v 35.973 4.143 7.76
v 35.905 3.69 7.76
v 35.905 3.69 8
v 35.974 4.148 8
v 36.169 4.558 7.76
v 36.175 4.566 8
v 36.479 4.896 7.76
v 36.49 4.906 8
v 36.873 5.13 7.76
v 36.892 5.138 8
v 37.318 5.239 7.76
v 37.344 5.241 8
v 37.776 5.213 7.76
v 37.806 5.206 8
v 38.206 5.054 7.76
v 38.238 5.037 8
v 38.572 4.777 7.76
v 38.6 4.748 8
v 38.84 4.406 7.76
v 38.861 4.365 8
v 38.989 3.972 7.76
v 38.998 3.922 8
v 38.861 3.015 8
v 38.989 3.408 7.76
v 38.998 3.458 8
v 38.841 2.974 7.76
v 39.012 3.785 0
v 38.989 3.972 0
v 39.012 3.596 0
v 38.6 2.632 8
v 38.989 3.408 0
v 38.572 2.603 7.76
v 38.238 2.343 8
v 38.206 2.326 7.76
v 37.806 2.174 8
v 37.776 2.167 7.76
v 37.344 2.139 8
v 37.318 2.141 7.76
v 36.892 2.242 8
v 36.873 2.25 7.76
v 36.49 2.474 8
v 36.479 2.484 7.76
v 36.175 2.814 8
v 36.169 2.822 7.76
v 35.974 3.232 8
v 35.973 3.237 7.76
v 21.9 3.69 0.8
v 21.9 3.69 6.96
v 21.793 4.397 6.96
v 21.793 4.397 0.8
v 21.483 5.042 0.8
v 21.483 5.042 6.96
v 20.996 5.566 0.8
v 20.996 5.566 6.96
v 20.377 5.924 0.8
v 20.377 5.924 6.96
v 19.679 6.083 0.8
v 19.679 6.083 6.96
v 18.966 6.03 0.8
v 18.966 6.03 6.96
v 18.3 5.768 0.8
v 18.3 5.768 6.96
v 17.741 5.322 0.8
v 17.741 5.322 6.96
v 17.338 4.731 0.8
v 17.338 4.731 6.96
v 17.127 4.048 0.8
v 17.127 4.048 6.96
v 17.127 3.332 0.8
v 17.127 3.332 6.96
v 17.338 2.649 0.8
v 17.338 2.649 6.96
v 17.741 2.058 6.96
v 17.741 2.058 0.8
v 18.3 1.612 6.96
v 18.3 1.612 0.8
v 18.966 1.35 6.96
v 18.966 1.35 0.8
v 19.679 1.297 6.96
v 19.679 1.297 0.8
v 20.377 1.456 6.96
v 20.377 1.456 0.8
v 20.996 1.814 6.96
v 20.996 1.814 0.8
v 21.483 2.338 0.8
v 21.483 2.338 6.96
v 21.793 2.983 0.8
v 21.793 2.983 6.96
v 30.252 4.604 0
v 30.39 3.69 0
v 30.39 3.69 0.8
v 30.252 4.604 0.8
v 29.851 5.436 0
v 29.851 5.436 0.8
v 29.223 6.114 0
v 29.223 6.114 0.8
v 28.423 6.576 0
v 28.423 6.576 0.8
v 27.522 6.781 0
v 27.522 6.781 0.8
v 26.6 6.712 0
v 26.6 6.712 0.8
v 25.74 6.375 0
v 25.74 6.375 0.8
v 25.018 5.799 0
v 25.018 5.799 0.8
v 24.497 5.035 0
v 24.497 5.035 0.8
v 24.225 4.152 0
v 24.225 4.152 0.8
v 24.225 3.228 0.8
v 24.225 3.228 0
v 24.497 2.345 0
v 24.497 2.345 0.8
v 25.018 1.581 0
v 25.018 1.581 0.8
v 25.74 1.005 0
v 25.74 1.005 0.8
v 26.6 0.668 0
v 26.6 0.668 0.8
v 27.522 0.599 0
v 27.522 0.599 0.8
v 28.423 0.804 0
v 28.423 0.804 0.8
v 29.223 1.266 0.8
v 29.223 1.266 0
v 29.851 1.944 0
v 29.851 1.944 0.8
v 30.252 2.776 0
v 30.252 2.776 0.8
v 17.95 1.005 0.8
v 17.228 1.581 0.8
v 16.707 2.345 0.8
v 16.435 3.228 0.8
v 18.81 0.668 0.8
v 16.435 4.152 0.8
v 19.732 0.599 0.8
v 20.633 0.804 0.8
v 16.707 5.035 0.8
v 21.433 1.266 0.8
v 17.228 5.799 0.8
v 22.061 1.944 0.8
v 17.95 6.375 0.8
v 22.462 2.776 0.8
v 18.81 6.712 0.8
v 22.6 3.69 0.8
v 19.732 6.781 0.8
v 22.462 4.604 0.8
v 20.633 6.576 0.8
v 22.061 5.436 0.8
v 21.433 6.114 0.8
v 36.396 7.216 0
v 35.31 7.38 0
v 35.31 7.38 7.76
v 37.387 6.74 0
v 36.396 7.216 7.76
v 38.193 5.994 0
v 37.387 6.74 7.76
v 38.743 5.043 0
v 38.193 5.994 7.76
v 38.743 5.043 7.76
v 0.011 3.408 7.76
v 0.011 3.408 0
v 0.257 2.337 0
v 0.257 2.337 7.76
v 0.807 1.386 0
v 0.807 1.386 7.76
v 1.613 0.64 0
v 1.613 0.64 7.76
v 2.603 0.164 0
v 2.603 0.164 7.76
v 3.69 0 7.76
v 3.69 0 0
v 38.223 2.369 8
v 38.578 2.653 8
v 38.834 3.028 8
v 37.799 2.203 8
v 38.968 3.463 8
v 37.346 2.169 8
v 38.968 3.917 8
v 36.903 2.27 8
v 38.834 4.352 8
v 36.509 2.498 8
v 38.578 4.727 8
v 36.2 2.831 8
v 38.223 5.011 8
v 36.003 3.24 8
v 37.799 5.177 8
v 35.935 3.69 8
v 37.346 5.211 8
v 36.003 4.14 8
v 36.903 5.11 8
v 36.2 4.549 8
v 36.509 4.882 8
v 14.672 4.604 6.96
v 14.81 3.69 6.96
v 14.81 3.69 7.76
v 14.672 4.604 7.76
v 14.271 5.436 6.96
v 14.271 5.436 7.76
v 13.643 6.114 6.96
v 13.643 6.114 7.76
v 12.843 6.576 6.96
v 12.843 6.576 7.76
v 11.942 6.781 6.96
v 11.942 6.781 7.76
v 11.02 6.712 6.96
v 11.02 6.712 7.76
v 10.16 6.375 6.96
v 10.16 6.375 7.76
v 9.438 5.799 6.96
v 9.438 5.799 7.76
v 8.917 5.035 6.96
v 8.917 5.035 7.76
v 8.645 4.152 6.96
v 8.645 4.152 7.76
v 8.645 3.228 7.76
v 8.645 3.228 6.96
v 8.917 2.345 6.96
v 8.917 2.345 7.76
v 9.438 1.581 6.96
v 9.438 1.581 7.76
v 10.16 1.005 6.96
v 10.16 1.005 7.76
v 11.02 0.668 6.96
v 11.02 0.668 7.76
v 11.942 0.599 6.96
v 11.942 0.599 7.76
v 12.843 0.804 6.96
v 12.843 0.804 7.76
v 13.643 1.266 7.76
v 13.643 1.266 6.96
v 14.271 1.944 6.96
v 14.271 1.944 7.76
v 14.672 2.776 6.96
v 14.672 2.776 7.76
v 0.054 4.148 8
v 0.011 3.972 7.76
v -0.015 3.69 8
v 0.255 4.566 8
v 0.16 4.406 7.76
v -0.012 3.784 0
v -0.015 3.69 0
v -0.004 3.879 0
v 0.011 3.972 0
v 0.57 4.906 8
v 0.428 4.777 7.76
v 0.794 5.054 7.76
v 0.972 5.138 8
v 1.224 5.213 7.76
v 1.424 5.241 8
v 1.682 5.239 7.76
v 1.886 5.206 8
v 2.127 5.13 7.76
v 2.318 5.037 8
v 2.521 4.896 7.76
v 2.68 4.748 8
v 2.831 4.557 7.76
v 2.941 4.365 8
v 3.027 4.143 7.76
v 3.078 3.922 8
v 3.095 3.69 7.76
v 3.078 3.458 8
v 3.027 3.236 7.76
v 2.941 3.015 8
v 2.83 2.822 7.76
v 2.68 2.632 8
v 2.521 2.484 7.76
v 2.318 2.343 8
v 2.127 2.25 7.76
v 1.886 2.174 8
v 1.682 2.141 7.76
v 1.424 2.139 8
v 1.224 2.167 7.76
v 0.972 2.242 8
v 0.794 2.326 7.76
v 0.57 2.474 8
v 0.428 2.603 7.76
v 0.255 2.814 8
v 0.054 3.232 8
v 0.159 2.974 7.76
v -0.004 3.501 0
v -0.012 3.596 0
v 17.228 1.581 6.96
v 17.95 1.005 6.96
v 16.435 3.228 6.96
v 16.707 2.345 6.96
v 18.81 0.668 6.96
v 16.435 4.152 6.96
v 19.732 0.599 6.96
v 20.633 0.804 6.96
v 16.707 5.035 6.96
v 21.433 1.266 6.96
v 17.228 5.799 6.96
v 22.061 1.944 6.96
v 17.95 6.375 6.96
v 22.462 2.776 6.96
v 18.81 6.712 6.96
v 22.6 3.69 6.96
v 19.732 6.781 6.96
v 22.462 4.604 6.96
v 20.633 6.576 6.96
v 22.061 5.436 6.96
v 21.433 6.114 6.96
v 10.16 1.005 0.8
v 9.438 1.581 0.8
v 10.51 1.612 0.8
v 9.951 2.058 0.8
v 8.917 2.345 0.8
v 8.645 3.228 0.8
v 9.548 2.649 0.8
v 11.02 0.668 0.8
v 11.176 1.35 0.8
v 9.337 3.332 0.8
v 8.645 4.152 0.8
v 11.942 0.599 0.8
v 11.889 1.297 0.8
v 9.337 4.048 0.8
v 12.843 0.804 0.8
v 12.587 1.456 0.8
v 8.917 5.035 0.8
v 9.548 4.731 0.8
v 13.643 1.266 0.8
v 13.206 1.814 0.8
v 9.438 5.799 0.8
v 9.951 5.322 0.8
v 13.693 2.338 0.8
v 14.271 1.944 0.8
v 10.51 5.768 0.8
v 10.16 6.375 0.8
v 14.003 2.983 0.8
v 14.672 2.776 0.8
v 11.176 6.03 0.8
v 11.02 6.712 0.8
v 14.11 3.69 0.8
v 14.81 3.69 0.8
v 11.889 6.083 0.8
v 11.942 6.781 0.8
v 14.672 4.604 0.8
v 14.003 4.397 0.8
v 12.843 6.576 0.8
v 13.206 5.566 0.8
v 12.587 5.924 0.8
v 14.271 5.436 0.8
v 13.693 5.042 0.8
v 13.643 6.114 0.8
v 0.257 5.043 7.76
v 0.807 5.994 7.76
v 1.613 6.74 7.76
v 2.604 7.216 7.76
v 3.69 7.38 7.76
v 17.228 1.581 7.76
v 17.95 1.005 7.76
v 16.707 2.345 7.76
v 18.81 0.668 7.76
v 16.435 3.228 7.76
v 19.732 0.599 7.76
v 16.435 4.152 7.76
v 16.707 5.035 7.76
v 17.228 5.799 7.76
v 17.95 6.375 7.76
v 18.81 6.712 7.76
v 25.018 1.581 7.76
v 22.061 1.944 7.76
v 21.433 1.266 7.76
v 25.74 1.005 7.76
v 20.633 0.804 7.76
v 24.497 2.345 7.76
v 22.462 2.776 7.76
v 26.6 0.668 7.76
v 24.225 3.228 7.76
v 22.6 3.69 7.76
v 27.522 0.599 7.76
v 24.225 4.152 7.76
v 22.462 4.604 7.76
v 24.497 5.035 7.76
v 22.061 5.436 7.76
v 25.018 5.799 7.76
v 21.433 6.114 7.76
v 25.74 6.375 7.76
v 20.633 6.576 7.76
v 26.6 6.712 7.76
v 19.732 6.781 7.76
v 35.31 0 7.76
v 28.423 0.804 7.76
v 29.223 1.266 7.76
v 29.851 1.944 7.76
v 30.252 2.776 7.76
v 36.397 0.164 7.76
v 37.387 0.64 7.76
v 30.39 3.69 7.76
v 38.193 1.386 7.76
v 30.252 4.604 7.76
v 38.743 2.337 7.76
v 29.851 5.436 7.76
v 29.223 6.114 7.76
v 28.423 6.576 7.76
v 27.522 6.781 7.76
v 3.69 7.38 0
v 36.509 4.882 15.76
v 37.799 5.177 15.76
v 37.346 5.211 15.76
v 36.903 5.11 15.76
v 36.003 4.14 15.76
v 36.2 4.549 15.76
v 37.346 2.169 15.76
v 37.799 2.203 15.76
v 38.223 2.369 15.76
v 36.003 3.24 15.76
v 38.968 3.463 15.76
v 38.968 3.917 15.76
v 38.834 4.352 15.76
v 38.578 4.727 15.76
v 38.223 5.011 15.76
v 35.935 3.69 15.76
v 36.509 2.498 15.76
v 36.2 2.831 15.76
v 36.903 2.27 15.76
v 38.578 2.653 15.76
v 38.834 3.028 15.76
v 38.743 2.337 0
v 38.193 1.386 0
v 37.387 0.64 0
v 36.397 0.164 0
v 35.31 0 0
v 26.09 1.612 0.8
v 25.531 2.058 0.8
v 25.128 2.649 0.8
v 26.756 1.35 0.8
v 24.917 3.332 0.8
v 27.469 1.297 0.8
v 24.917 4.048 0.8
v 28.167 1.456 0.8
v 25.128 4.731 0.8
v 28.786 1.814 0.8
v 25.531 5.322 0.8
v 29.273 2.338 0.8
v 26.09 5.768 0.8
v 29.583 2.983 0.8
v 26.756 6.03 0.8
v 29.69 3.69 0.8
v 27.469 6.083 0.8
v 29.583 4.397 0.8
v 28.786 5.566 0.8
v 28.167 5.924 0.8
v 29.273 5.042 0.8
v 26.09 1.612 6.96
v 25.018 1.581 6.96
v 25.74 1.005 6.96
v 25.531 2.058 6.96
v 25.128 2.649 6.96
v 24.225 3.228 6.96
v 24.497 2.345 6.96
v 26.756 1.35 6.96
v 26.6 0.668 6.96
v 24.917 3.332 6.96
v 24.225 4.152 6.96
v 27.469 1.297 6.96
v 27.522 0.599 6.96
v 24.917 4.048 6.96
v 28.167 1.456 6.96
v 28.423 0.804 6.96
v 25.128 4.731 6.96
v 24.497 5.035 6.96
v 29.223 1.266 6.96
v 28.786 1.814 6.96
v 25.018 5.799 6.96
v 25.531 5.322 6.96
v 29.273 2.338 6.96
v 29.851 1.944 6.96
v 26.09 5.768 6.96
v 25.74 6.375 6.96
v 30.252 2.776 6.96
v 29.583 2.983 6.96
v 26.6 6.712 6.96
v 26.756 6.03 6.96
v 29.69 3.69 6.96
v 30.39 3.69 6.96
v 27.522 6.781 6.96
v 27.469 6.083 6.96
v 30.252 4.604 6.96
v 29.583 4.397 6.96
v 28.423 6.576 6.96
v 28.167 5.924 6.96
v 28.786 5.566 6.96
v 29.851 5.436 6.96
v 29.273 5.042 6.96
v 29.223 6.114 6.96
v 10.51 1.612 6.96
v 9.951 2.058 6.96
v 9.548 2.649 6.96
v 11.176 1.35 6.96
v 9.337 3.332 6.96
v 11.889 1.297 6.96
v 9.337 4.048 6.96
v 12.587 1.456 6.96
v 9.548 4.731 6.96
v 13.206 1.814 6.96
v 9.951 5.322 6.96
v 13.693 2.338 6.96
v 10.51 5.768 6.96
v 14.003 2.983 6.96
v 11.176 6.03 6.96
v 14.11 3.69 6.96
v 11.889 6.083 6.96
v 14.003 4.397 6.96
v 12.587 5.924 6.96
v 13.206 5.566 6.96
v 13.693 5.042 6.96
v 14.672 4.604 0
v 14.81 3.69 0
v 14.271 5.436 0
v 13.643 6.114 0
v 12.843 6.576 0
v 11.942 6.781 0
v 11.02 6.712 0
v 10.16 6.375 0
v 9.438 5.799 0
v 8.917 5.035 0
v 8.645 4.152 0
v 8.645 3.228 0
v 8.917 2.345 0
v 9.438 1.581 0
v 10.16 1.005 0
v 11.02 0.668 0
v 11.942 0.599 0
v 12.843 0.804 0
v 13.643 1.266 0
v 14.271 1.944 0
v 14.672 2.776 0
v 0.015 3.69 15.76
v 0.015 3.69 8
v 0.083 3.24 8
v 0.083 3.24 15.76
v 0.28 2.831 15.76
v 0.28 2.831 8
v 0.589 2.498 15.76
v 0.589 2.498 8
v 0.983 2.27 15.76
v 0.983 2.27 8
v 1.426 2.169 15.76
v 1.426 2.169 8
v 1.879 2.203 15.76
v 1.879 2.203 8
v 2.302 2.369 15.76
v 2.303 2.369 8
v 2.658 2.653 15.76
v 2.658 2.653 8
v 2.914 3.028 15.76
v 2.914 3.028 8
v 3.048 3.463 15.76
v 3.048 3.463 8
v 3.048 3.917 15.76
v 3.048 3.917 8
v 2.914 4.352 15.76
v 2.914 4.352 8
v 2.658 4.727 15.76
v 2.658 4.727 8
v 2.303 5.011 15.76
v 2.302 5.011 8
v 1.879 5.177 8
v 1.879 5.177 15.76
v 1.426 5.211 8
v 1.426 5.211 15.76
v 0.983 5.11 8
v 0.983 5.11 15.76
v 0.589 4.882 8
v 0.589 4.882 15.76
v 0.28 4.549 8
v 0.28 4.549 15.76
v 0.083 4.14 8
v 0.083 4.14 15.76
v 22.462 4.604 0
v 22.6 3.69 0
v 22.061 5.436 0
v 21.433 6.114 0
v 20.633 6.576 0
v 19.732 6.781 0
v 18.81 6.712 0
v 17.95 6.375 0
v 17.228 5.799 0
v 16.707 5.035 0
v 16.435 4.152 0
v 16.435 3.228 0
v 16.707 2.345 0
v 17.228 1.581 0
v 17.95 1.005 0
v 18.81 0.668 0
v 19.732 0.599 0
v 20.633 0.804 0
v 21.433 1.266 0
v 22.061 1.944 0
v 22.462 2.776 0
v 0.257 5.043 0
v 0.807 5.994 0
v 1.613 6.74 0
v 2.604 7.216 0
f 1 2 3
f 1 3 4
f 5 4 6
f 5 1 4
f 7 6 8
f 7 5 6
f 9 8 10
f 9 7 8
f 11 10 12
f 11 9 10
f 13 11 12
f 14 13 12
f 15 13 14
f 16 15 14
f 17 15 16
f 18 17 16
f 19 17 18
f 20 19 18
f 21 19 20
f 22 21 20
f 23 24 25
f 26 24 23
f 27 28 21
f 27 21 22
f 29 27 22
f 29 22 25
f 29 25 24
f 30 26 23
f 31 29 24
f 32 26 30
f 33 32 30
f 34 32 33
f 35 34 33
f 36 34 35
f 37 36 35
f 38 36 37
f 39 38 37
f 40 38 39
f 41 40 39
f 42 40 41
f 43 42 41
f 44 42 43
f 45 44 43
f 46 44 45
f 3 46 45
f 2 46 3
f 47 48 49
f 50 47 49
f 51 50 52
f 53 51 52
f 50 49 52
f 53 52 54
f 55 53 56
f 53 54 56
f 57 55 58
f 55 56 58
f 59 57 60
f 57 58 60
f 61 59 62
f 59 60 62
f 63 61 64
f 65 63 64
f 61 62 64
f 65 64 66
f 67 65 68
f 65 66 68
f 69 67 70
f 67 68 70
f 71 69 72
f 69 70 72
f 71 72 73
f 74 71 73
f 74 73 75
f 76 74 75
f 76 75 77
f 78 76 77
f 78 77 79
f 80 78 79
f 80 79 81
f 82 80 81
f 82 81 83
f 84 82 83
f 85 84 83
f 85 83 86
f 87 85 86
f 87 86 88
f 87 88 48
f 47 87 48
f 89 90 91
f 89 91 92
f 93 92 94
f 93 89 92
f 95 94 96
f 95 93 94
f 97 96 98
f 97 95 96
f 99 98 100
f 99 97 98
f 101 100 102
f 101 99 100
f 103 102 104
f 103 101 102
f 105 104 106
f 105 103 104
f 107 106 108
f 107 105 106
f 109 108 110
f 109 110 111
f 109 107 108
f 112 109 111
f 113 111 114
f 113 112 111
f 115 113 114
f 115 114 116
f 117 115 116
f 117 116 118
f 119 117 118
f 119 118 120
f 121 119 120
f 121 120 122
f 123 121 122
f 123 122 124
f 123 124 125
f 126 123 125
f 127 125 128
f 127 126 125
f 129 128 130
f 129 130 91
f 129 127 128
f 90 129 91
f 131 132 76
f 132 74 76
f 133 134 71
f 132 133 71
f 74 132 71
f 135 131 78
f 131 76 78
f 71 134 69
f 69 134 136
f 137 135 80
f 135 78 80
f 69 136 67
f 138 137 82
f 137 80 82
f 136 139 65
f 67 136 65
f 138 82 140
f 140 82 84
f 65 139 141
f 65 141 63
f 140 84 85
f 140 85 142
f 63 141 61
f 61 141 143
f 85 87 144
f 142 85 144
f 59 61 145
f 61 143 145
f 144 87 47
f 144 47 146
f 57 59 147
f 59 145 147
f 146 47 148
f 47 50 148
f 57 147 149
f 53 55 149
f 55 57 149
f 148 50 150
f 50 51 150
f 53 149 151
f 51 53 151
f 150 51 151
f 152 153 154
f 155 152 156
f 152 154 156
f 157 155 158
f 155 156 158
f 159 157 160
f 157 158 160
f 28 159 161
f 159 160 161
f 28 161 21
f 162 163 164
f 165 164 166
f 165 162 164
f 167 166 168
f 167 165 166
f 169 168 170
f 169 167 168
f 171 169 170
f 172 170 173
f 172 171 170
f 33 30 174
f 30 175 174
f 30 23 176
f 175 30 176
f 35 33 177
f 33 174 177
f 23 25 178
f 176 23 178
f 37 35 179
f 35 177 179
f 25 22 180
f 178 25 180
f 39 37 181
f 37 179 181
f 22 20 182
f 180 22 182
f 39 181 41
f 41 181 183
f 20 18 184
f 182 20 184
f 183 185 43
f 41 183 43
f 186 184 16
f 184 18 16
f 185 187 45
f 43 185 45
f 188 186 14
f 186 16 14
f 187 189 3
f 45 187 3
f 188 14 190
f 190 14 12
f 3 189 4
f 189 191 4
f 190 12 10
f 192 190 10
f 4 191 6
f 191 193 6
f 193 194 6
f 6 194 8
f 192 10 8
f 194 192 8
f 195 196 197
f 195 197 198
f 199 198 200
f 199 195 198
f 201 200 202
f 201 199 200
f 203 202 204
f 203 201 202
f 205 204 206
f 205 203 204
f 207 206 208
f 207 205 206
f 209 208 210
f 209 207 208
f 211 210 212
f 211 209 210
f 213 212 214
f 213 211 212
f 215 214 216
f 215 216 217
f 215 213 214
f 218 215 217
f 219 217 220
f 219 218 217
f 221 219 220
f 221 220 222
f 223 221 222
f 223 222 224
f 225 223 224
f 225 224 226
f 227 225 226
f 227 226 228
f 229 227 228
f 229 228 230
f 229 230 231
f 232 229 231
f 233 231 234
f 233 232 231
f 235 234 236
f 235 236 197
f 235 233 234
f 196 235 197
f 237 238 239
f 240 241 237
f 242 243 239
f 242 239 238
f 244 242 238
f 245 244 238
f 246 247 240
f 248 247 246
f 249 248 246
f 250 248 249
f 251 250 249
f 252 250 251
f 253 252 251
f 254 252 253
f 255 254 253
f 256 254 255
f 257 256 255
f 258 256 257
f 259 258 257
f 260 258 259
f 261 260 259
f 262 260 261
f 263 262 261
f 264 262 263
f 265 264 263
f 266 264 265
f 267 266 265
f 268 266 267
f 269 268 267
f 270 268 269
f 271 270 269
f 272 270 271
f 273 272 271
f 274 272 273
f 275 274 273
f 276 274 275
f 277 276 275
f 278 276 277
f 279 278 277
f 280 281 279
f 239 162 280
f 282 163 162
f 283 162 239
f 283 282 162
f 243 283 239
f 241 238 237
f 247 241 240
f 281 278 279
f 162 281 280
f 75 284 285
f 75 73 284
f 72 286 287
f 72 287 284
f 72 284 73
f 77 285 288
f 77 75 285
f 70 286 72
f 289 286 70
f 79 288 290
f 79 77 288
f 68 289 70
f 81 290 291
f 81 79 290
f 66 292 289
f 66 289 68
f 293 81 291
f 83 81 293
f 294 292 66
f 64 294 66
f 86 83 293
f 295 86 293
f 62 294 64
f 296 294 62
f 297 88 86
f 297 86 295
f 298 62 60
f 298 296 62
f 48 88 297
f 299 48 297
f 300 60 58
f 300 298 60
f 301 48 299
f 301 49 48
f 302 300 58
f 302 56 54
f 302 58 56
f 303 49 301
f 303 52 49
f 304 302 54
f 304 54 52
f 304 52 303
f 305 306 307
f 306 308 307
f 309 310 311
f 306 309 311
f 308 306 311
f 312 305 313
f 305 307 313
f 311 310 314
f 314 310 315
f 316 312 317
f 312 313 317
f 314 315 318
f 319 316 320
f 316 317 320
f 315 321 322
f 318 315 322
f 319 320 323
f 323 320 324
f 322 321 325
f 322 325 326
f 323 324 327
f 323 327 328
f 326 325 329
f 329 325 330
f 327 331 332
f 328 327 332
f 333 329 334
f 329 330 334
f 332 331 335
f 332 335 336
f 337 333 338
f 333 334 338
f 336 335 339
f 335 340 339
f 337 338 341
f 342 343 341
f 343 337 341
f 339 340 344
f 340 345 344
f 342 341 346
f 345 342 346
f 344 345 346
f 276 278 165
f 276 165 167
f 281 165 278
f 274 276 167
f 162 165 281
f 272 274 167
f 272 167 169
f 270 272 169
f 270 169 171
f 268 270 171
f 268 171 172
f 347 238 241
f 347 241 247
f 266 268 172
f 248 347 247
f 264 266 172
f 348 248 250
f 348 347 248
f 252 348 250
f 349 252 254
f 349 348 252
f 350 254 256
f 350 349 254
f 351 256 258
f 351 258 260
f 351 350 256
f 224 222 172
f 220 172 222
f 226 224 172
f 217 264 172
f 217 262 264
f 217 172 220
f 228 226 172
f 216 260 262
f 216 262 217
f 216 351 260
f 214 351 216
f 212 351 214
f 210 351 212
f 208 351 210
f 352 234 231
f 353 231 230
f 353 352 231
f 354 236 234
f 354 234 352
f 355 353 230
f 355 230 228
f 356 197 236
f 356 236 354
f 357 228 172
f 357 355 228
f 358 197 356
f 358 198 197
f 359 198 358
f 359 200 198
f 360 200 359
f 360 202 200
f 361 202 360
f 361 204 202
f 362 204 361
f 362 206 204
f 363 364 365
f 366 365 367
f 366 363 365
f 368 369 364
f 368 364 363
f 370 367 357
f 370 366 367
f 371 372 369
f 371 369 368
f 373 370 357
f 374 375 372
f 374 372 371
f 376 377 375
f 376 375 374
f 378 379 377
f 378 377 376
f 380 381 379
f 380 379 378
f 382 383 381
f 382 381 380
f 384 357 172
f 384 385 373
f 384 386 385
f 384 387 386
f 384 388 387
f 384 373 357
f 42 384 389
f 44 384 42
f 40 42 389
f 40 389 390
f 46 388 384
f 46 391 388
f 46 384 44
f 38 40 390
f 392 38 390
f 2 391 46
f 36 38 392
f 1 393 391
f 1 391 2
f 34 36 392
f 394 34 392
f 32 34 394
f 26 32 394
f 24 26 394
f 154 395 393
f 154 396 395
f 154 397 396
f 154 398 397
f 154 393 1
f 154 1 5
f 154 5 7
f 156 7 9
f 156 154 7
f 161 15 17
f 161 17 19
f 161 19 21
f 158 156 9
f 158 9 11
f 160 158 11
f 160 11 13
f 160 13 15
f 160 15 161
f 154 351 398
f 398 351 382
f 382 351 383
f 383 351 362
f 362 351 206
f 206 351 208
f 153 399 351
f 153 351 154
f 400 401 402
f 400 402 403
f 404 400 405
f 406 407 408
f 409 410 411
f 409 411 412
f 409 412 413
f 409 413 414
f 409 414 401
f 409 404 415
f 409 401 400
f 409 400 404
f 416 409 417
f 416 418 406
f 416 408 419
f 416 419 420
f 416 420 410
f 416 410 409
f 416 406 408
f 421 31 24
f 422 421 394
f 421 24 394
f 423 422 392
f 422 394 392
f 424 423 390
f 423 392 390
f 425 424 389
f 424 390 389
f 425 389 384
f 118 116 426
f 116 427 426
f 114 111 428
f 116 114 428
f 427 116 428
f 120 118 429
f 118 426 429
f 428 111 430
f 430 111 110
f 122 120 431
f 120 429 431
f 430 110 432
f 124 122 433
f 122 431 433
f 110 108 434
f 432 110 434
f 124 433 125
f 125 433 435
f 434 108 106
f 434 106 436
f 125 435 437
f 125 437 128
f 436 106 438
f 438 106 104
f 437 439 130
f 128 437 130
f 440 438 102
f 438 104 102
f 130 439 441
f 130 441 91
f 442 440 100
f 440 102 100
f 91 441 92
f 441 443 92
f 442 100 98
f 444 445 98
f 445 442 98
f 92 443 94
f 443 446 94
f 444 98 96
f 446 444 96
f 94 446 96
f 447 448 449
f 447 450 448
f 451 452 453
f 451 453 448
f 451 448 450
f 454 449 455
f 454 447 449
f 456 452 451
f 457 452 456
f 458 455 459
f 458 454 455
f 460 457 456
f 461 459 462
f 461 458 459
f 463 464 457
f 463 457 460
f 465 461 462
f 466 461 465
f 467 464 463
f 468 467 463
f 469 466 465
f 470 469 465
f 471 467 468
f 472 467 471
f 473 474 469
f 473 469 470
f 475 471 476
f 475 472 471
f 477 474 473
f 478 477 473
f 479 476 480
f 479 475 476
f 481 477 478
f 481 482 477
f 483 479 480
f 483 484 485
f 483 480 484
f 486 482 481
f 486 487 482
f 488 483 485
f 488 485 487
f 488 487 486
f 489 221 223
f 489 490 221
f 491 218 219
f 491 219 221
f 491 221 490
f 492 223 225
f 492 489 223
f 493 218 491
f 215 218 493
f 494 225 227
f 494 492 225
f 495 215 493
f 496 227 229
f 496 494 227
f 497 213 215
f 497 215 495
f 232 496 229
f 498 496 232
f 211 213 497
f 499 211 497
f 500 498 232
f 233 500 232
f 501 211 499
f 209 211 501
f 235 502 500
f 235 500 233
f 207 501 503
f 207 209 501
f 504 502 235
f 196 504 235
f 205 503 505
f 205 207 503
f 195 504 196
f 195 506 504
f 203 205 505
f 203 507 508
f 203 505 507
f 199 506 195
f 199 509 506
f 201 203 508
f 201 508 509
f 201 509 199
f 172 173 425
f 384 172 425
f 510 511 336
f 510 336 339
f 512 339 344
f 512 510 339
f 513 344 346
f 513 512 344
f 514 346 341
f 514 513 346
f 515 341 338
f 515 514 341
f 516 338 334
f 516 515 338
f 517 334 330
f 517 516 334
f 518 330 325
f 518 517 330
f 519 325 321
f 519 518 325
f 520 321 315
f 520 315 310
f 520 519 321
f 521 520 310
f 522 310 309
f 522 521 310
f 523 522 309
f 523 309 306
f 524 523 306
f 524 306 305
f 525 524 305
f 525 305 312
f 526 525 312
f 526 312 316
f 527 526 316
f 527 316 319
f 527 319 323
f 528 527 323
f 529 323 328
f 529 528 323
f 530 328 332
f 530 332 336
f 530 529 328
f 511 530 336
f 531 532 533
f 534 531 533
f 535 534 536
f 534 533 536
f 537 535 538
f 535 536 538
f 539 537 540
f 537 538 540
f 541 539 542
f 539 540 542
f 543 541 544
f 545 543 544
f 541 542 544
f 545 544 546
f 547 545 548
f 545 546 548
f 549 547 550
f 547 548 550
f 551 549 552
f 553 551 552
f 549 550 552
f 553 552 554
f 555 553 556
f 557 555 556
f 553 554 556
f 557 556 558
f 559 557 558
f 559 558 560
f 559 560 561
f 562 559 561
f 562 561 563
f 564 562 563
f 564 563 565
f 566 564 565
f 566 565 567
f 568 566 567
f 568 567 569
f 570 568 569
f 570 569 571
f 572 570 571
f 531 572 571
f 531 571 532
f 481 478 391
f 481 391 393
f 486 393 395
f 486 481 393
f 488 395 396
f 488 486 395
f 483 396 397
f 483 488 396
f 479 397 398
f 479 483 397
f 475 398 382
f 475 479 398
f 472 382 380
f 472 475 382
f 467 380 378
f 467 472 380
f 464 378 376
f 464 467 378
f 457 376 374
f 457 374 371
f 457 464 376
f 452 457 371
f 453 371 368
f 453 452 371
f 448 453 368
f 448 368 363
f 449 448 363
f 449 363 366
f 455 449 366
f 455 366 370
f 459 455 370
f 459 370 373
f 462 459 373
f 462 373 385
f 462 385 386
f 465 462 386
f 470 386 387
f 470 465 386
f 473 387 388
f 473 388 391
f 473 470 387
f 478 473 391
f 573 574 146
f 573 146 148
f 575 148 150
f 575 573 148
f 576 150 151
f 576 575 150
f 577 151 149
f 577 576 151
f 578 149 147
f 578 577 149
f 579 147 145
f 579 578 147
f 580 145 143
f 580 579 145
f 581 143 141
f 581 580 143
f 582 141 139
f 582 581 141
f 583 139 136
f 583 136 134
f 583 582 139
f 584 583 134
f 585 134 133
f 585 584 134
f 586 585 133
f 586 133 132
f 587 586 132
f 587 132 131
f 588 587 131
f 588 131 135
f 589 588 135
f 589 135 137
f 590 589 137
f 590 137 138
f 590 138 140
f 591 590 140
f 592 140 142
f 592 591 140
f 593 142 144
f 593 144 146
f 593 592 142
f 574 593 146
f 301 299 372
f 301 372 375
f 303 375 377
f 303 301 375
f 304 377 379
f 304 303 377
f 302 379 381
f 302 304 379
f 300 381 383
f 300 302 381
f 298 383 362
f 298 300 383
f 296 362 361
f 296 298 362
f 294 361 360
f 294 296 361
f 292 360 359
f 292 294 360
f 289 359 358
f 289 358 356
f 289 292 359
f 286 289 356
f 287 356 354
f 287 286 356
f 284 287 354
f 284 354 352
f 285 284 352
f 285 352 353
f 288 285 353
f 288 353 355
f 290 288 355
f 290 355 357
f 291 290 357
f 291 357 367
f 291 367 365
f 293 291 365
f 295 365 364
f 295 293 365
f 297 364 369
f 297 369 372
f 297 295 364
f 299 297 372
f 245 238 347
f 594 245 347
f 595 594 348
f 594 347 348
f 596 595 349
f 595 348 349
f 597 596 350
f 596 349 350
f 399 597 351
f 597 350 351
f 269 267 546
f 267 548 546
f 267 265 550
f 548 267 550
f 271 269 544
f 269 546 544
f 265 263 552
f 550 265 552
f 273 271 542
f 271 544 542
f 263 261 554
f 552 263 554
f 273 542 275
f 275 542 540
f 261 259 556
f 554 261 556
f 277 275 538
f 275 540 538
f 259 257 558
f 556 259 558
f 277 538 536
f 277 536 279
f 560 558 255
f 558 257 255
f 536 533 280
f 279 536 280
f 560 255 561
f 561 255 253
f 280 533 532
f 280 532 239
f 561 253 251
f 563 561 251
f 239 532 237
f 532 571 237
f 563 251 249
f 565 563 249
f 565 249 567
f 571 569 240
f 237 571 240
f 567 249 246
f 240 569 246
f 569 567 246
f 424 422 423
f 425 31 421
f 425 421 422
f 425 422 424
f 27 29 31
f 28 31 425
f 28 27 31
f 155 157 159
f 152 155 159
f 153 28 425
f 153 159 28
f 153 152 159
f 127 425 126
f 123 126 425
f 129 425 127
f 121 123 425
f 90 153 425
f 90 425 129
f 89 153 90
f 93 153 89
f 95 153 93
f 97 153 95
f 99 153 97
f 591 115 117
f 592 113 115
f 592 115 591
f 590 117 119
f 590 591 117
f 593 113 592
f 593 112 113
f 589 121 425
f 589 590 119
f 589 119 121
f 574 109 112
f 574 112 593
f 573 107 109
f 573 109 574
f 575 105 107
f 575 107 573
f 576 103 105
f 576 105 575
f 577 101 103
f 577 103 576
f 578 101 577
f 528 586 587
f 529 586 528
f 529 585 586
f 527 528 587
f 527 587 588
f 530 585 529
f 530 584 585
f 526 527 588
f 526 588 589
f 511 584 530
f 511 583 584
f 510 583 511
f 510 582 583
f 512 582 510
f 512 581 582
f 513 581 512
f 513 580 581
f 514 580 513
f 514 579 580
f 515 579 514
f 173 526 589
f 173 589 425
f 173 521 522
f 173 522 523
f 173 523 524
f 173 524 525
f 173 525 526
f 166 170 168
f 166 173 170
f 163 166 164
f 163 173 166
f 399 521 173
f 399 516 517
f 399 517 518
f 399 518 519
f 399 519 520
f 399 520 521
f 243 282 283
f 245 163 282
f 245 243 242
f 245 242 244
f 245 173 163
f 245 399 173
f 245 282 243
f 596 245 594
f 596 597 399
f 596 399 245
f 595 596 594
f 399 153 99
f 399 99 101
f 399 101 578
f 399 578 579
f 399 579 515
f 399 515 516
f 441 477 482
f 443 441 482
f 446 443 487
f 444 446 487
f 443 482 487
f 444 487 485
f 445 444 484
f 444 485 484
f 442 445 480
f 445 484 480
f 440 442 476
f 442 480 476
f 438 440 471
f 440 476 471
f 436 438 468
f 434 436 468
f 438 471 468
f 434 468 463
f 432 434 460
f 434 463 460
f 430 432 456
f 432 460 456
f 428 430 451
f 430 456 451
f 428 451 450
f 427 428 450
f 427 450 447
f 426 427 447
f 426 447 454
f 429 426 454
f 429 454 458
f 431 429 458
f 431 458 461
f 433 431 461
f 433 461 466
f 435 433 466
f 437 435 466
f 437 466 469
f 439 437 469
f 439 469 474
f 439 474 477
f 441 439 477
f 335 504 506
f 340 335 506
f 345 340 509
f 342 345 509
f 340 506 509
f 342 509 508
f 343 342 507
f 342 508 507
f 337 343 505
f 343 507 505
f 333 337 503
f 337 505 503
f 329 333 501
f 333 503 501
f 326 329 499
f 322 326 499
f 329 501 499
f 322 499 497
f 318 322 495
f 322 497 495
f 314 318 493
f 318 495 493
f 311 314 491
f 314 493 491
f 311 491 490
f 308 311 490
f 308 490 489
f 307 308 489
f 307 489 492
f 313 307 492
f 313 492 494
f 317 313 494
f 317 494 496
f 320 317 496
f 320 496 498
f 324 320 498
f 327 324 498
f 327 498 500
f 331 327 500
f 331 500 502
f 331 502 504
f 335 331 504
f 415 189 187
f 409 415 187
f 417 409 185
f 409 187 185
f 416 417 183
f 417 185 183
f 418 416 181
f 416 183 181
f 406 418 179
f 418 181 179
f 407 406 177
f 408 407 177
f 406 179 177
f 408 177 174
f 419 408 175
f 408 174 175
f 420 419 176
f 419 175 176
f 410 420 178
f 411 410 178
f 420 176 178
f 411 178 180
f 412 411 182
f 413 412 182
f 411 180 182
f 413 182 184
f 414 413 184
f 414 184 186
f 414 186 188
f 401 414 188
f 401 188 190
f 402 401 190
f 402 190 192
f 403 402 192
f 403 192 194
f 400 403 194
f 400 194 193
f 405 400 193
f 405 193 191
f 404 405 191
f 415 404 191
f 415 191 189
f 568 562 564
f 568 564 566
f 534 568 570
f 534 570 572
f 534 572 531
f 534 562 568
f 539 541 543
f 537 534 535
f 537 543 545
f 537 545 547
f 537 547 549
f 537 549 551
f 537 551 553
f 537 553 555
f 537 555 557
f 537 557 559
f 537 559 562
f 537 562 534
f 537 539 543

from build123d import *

# Parameters (mm, degrees)
SKETCH1_W                = 39
SKETCH1_H                = 7.38
BOSS_EXTRUDE1_DEPTH      = 7.76
SKETCH2_R                = 2.4
CUT_EXTRUDE1_DEPTH       = 7.76
CUT_EXTRUDE2_OUTLINE_R   = 3.1
CUT_EXTRUDE2_OUTLINE_R_2 = 2.4
CUT_EXTRUDE2_DEPTH       = 0.8
CUT_EXTRUDE3_START       = 6.96
CUT_EXTRUDE3_OUTLINE_R   = 3.1
CUT_EXTRUDE3_OUTLINE_R_2 = 2.4
CUT_EXTRUDE3_DEPTH       = 0.8
LPATTERN3_COUNT          = 3
LPATTERN3_PITCH          = 7.79
LPATTERN6_COUNT          = 3
LPATTERN6_PITCH          = 7.79
FILLET1_R                = 3.69
FILLET2_R                = 3.69
FILLET3_R                = 3.69
FILLET4_R                = 3.69
SKETCH3_R                = 3.1
BOSS_EXTRUDE2_DEPTH      = 7.76
BOSS_EXTRUDE3_START      = -7.76
SKETCH4_R                = 3.1
BOSS_EXTRUDE3_DEPTH      = 7.76
SKETCH11_R               = 1.525
BOSS_EXTRUDE7_DEPTH      = 8
SKETCH12_R               = 1.555
BOSS_EXTRUDE8_DEPTH      = 8
SKETCH14_R               = 1.555
BOSS_EXTRUDE9_DEPTH      = 8


# Read off the part's stored shape, not the designer's step: Cut-Extrude2, Cut-Extrude3
with BuildPart() as part:
    # Sketch1 → Boss-Extrude1 (new body)
    with BuildSketch(Plane.XY):
        with Locations((19.5, 3.69)):
            Rectangle(SKETCH1_W, SKETCH1_H)
    extrude(amount=BOSS_EXTRUDE1_DEPTH)

    # Sketch2 → Cut-Extrude1 (cut)
    with BuildSketch(Plane.XY.offset(7.76)):
        with Locations((19.5, 3.69)):
            Circle(SKETCH2_R)
    cut_extrude1 = extrude(amount=-CUT_EXTRUDE1_DEPTH, mode=Mode.SUBTRACT)

    # Cut-Extrude2 outline → Cut-Extrude2 (cut)
    with BuildSketch(Plane.XY):
        with Locations((19.5, 3.69)):
            Circle(CUT_EXTRUDE2_OUTLINE_R)
        with Locations((19.5, 3.69)):
            Circle(CUT_EXTRUDE2_OUTLINE_R_2, mode=Mode.SUBTRACT)
    cut_extrude2 = extrude(amount=CUT_EXTRUDE2_DEPTH, mode=Mode.SUBTRACT)

    # Cut-Extrude3 outline → Cut-Extrude3 (cut)
    with BuildSketch(Plane.XY.offset(CUT_EXTRUDE3_START)):
        with Locations((19.5, 3.69)):
            Circle(CUT_EXTRUDE3_OUTLINE_R)
        with Locations((19.5, 3.69)):
            Circle(CUT_EXTRUDE3_OUTLINE_R_2, mode=Mode.SUBTRACT)
    cut_extrude3 = extrude(amount=CUT_EXTRUDE3_DEPTH, mode=Mode.SUBTRACT)

    # LPattern3: Cut-Extrude1, Cut-Extrude2, Cut-Extrude3 ×3
    with Locations(*[(-i * LPATTERN3_PITCH, 0, 0) for i in range(1, LPATTERN3_COUNT)]):
        add(cut_extrude1, mode=Mode.SUBTRACT)
        add(cut_extrude2, mode=Mode.SUBTRACT)
        add(cut_extrude3, mode=Mode.SUBTRACT)

    # LPattern6: Cut-Extrude1, Cut-Extrude2, Cut-Extrude3 ×3
    with Locations(*[(i * LPATTERN6_PITCH, 0, 0) for i in range(1, LPATTERN6_COUNT)]):
        add(cut_extrude1, mode=Mode.SUBTRACT)
        add(cut_extrude2, mode=Mode.SUBTRACT)
        add(cut_extrude3, mode=Mode.SUBTRACT)

    # Fillet1
    fillet1_edges = [part.edges().sort_by_distance(p)[0] for p in [
        (0, 7.38, 3.88),
    ]]
    fillet(fillet1_edges, radius=FILLET1_R)

    # Fillet2
    fillet2_edges = [part.edges().sort_by_distance(p)[0] for p in [
        (0, 0, 3.88),
    ]]
    fillet(fillet2_edges, radius=FILLET2_R - 0.0001)  # a hair under: the kernel refuses the full size

    # Fillet3
    fillet3_edges = [part.edges().sort_by_distance(p)[0] for p in [
        (39, 7.38, 3.88),
    ]]
    fillet(fillet3_edges, radius=FILLET3_R)

    # Fillet4
    fillet4_edges = [part.edges().sort_by_distance(p)[0] for p in [
        (39, 0, 3.88),
    ]]
    fillet(fillet4_edges, radius=FILLET4_R - 0.0001)  # a hair under: the kernel refuses the full size

    # Sketch3 → Boss-Extrude2 (add)
    with BuildSketch(Plane(origin=(0, 0, 0), x_dir=(-1, 0, 0), z_dir=(0, 0, -1))):
        with Locations((-35.08, 3.69)):
            Circle(SKETCH3_R)
    extrude(amount=-BOSS_EXTRUDE2_DEPTH)

    # Sketch4 → Boss-Extrude3 (add)
    with BuildSketch(Plane.XY.offset(7.76).offset(BOSS_EXTRUDE3_START)):
        with Locations((3.92, 3.69)):
            Circle(SKETCH4_R)
    extrude(amount=BOSS_EXTRUDE3_DEPTH)

    # Sketch11 → Boss-Extrude7 (add)
    with BuildSketch(Plane.XY.offset(7.76)):
        with Locations(Location((1.54, 3.69, 0), (0, 0, 180))):
            Circle(SKETCH11_R)
        with Locations(Location((37.46, 3.69, 0), (0, 0, 180))):
            Circle(SKETCH11_R)
    extrude(amount=BOSS_EXTRUDE7_DEPTH)

    # Sketch12 → Boss-Extrude8 (add)
    with BuildSketch(Plane(origin=(0, 0, 0), x_dir=(-1, 0, 0), z_dir=(0, 0, -1))):
        with Locations((-37.46, 3.69)):
            Circle(SKETCH12_R)
    extrude(amount=-BOSS_EXTRUDE8_DEPTH)

    # Sketch14 → Boss-Extrude9 (add)
    with BuildSketch(Plane(origin=(0, 0, 0), x_dir=(-1, 0, 0), z_dir=(0, 0, -1))):
        with Locations((-1.54, 3.69)):
            Circle(SKETCH14_R)
    extrude(amount=-BOSS_EXTRUDE9_DEPTH)


solid = part.part
